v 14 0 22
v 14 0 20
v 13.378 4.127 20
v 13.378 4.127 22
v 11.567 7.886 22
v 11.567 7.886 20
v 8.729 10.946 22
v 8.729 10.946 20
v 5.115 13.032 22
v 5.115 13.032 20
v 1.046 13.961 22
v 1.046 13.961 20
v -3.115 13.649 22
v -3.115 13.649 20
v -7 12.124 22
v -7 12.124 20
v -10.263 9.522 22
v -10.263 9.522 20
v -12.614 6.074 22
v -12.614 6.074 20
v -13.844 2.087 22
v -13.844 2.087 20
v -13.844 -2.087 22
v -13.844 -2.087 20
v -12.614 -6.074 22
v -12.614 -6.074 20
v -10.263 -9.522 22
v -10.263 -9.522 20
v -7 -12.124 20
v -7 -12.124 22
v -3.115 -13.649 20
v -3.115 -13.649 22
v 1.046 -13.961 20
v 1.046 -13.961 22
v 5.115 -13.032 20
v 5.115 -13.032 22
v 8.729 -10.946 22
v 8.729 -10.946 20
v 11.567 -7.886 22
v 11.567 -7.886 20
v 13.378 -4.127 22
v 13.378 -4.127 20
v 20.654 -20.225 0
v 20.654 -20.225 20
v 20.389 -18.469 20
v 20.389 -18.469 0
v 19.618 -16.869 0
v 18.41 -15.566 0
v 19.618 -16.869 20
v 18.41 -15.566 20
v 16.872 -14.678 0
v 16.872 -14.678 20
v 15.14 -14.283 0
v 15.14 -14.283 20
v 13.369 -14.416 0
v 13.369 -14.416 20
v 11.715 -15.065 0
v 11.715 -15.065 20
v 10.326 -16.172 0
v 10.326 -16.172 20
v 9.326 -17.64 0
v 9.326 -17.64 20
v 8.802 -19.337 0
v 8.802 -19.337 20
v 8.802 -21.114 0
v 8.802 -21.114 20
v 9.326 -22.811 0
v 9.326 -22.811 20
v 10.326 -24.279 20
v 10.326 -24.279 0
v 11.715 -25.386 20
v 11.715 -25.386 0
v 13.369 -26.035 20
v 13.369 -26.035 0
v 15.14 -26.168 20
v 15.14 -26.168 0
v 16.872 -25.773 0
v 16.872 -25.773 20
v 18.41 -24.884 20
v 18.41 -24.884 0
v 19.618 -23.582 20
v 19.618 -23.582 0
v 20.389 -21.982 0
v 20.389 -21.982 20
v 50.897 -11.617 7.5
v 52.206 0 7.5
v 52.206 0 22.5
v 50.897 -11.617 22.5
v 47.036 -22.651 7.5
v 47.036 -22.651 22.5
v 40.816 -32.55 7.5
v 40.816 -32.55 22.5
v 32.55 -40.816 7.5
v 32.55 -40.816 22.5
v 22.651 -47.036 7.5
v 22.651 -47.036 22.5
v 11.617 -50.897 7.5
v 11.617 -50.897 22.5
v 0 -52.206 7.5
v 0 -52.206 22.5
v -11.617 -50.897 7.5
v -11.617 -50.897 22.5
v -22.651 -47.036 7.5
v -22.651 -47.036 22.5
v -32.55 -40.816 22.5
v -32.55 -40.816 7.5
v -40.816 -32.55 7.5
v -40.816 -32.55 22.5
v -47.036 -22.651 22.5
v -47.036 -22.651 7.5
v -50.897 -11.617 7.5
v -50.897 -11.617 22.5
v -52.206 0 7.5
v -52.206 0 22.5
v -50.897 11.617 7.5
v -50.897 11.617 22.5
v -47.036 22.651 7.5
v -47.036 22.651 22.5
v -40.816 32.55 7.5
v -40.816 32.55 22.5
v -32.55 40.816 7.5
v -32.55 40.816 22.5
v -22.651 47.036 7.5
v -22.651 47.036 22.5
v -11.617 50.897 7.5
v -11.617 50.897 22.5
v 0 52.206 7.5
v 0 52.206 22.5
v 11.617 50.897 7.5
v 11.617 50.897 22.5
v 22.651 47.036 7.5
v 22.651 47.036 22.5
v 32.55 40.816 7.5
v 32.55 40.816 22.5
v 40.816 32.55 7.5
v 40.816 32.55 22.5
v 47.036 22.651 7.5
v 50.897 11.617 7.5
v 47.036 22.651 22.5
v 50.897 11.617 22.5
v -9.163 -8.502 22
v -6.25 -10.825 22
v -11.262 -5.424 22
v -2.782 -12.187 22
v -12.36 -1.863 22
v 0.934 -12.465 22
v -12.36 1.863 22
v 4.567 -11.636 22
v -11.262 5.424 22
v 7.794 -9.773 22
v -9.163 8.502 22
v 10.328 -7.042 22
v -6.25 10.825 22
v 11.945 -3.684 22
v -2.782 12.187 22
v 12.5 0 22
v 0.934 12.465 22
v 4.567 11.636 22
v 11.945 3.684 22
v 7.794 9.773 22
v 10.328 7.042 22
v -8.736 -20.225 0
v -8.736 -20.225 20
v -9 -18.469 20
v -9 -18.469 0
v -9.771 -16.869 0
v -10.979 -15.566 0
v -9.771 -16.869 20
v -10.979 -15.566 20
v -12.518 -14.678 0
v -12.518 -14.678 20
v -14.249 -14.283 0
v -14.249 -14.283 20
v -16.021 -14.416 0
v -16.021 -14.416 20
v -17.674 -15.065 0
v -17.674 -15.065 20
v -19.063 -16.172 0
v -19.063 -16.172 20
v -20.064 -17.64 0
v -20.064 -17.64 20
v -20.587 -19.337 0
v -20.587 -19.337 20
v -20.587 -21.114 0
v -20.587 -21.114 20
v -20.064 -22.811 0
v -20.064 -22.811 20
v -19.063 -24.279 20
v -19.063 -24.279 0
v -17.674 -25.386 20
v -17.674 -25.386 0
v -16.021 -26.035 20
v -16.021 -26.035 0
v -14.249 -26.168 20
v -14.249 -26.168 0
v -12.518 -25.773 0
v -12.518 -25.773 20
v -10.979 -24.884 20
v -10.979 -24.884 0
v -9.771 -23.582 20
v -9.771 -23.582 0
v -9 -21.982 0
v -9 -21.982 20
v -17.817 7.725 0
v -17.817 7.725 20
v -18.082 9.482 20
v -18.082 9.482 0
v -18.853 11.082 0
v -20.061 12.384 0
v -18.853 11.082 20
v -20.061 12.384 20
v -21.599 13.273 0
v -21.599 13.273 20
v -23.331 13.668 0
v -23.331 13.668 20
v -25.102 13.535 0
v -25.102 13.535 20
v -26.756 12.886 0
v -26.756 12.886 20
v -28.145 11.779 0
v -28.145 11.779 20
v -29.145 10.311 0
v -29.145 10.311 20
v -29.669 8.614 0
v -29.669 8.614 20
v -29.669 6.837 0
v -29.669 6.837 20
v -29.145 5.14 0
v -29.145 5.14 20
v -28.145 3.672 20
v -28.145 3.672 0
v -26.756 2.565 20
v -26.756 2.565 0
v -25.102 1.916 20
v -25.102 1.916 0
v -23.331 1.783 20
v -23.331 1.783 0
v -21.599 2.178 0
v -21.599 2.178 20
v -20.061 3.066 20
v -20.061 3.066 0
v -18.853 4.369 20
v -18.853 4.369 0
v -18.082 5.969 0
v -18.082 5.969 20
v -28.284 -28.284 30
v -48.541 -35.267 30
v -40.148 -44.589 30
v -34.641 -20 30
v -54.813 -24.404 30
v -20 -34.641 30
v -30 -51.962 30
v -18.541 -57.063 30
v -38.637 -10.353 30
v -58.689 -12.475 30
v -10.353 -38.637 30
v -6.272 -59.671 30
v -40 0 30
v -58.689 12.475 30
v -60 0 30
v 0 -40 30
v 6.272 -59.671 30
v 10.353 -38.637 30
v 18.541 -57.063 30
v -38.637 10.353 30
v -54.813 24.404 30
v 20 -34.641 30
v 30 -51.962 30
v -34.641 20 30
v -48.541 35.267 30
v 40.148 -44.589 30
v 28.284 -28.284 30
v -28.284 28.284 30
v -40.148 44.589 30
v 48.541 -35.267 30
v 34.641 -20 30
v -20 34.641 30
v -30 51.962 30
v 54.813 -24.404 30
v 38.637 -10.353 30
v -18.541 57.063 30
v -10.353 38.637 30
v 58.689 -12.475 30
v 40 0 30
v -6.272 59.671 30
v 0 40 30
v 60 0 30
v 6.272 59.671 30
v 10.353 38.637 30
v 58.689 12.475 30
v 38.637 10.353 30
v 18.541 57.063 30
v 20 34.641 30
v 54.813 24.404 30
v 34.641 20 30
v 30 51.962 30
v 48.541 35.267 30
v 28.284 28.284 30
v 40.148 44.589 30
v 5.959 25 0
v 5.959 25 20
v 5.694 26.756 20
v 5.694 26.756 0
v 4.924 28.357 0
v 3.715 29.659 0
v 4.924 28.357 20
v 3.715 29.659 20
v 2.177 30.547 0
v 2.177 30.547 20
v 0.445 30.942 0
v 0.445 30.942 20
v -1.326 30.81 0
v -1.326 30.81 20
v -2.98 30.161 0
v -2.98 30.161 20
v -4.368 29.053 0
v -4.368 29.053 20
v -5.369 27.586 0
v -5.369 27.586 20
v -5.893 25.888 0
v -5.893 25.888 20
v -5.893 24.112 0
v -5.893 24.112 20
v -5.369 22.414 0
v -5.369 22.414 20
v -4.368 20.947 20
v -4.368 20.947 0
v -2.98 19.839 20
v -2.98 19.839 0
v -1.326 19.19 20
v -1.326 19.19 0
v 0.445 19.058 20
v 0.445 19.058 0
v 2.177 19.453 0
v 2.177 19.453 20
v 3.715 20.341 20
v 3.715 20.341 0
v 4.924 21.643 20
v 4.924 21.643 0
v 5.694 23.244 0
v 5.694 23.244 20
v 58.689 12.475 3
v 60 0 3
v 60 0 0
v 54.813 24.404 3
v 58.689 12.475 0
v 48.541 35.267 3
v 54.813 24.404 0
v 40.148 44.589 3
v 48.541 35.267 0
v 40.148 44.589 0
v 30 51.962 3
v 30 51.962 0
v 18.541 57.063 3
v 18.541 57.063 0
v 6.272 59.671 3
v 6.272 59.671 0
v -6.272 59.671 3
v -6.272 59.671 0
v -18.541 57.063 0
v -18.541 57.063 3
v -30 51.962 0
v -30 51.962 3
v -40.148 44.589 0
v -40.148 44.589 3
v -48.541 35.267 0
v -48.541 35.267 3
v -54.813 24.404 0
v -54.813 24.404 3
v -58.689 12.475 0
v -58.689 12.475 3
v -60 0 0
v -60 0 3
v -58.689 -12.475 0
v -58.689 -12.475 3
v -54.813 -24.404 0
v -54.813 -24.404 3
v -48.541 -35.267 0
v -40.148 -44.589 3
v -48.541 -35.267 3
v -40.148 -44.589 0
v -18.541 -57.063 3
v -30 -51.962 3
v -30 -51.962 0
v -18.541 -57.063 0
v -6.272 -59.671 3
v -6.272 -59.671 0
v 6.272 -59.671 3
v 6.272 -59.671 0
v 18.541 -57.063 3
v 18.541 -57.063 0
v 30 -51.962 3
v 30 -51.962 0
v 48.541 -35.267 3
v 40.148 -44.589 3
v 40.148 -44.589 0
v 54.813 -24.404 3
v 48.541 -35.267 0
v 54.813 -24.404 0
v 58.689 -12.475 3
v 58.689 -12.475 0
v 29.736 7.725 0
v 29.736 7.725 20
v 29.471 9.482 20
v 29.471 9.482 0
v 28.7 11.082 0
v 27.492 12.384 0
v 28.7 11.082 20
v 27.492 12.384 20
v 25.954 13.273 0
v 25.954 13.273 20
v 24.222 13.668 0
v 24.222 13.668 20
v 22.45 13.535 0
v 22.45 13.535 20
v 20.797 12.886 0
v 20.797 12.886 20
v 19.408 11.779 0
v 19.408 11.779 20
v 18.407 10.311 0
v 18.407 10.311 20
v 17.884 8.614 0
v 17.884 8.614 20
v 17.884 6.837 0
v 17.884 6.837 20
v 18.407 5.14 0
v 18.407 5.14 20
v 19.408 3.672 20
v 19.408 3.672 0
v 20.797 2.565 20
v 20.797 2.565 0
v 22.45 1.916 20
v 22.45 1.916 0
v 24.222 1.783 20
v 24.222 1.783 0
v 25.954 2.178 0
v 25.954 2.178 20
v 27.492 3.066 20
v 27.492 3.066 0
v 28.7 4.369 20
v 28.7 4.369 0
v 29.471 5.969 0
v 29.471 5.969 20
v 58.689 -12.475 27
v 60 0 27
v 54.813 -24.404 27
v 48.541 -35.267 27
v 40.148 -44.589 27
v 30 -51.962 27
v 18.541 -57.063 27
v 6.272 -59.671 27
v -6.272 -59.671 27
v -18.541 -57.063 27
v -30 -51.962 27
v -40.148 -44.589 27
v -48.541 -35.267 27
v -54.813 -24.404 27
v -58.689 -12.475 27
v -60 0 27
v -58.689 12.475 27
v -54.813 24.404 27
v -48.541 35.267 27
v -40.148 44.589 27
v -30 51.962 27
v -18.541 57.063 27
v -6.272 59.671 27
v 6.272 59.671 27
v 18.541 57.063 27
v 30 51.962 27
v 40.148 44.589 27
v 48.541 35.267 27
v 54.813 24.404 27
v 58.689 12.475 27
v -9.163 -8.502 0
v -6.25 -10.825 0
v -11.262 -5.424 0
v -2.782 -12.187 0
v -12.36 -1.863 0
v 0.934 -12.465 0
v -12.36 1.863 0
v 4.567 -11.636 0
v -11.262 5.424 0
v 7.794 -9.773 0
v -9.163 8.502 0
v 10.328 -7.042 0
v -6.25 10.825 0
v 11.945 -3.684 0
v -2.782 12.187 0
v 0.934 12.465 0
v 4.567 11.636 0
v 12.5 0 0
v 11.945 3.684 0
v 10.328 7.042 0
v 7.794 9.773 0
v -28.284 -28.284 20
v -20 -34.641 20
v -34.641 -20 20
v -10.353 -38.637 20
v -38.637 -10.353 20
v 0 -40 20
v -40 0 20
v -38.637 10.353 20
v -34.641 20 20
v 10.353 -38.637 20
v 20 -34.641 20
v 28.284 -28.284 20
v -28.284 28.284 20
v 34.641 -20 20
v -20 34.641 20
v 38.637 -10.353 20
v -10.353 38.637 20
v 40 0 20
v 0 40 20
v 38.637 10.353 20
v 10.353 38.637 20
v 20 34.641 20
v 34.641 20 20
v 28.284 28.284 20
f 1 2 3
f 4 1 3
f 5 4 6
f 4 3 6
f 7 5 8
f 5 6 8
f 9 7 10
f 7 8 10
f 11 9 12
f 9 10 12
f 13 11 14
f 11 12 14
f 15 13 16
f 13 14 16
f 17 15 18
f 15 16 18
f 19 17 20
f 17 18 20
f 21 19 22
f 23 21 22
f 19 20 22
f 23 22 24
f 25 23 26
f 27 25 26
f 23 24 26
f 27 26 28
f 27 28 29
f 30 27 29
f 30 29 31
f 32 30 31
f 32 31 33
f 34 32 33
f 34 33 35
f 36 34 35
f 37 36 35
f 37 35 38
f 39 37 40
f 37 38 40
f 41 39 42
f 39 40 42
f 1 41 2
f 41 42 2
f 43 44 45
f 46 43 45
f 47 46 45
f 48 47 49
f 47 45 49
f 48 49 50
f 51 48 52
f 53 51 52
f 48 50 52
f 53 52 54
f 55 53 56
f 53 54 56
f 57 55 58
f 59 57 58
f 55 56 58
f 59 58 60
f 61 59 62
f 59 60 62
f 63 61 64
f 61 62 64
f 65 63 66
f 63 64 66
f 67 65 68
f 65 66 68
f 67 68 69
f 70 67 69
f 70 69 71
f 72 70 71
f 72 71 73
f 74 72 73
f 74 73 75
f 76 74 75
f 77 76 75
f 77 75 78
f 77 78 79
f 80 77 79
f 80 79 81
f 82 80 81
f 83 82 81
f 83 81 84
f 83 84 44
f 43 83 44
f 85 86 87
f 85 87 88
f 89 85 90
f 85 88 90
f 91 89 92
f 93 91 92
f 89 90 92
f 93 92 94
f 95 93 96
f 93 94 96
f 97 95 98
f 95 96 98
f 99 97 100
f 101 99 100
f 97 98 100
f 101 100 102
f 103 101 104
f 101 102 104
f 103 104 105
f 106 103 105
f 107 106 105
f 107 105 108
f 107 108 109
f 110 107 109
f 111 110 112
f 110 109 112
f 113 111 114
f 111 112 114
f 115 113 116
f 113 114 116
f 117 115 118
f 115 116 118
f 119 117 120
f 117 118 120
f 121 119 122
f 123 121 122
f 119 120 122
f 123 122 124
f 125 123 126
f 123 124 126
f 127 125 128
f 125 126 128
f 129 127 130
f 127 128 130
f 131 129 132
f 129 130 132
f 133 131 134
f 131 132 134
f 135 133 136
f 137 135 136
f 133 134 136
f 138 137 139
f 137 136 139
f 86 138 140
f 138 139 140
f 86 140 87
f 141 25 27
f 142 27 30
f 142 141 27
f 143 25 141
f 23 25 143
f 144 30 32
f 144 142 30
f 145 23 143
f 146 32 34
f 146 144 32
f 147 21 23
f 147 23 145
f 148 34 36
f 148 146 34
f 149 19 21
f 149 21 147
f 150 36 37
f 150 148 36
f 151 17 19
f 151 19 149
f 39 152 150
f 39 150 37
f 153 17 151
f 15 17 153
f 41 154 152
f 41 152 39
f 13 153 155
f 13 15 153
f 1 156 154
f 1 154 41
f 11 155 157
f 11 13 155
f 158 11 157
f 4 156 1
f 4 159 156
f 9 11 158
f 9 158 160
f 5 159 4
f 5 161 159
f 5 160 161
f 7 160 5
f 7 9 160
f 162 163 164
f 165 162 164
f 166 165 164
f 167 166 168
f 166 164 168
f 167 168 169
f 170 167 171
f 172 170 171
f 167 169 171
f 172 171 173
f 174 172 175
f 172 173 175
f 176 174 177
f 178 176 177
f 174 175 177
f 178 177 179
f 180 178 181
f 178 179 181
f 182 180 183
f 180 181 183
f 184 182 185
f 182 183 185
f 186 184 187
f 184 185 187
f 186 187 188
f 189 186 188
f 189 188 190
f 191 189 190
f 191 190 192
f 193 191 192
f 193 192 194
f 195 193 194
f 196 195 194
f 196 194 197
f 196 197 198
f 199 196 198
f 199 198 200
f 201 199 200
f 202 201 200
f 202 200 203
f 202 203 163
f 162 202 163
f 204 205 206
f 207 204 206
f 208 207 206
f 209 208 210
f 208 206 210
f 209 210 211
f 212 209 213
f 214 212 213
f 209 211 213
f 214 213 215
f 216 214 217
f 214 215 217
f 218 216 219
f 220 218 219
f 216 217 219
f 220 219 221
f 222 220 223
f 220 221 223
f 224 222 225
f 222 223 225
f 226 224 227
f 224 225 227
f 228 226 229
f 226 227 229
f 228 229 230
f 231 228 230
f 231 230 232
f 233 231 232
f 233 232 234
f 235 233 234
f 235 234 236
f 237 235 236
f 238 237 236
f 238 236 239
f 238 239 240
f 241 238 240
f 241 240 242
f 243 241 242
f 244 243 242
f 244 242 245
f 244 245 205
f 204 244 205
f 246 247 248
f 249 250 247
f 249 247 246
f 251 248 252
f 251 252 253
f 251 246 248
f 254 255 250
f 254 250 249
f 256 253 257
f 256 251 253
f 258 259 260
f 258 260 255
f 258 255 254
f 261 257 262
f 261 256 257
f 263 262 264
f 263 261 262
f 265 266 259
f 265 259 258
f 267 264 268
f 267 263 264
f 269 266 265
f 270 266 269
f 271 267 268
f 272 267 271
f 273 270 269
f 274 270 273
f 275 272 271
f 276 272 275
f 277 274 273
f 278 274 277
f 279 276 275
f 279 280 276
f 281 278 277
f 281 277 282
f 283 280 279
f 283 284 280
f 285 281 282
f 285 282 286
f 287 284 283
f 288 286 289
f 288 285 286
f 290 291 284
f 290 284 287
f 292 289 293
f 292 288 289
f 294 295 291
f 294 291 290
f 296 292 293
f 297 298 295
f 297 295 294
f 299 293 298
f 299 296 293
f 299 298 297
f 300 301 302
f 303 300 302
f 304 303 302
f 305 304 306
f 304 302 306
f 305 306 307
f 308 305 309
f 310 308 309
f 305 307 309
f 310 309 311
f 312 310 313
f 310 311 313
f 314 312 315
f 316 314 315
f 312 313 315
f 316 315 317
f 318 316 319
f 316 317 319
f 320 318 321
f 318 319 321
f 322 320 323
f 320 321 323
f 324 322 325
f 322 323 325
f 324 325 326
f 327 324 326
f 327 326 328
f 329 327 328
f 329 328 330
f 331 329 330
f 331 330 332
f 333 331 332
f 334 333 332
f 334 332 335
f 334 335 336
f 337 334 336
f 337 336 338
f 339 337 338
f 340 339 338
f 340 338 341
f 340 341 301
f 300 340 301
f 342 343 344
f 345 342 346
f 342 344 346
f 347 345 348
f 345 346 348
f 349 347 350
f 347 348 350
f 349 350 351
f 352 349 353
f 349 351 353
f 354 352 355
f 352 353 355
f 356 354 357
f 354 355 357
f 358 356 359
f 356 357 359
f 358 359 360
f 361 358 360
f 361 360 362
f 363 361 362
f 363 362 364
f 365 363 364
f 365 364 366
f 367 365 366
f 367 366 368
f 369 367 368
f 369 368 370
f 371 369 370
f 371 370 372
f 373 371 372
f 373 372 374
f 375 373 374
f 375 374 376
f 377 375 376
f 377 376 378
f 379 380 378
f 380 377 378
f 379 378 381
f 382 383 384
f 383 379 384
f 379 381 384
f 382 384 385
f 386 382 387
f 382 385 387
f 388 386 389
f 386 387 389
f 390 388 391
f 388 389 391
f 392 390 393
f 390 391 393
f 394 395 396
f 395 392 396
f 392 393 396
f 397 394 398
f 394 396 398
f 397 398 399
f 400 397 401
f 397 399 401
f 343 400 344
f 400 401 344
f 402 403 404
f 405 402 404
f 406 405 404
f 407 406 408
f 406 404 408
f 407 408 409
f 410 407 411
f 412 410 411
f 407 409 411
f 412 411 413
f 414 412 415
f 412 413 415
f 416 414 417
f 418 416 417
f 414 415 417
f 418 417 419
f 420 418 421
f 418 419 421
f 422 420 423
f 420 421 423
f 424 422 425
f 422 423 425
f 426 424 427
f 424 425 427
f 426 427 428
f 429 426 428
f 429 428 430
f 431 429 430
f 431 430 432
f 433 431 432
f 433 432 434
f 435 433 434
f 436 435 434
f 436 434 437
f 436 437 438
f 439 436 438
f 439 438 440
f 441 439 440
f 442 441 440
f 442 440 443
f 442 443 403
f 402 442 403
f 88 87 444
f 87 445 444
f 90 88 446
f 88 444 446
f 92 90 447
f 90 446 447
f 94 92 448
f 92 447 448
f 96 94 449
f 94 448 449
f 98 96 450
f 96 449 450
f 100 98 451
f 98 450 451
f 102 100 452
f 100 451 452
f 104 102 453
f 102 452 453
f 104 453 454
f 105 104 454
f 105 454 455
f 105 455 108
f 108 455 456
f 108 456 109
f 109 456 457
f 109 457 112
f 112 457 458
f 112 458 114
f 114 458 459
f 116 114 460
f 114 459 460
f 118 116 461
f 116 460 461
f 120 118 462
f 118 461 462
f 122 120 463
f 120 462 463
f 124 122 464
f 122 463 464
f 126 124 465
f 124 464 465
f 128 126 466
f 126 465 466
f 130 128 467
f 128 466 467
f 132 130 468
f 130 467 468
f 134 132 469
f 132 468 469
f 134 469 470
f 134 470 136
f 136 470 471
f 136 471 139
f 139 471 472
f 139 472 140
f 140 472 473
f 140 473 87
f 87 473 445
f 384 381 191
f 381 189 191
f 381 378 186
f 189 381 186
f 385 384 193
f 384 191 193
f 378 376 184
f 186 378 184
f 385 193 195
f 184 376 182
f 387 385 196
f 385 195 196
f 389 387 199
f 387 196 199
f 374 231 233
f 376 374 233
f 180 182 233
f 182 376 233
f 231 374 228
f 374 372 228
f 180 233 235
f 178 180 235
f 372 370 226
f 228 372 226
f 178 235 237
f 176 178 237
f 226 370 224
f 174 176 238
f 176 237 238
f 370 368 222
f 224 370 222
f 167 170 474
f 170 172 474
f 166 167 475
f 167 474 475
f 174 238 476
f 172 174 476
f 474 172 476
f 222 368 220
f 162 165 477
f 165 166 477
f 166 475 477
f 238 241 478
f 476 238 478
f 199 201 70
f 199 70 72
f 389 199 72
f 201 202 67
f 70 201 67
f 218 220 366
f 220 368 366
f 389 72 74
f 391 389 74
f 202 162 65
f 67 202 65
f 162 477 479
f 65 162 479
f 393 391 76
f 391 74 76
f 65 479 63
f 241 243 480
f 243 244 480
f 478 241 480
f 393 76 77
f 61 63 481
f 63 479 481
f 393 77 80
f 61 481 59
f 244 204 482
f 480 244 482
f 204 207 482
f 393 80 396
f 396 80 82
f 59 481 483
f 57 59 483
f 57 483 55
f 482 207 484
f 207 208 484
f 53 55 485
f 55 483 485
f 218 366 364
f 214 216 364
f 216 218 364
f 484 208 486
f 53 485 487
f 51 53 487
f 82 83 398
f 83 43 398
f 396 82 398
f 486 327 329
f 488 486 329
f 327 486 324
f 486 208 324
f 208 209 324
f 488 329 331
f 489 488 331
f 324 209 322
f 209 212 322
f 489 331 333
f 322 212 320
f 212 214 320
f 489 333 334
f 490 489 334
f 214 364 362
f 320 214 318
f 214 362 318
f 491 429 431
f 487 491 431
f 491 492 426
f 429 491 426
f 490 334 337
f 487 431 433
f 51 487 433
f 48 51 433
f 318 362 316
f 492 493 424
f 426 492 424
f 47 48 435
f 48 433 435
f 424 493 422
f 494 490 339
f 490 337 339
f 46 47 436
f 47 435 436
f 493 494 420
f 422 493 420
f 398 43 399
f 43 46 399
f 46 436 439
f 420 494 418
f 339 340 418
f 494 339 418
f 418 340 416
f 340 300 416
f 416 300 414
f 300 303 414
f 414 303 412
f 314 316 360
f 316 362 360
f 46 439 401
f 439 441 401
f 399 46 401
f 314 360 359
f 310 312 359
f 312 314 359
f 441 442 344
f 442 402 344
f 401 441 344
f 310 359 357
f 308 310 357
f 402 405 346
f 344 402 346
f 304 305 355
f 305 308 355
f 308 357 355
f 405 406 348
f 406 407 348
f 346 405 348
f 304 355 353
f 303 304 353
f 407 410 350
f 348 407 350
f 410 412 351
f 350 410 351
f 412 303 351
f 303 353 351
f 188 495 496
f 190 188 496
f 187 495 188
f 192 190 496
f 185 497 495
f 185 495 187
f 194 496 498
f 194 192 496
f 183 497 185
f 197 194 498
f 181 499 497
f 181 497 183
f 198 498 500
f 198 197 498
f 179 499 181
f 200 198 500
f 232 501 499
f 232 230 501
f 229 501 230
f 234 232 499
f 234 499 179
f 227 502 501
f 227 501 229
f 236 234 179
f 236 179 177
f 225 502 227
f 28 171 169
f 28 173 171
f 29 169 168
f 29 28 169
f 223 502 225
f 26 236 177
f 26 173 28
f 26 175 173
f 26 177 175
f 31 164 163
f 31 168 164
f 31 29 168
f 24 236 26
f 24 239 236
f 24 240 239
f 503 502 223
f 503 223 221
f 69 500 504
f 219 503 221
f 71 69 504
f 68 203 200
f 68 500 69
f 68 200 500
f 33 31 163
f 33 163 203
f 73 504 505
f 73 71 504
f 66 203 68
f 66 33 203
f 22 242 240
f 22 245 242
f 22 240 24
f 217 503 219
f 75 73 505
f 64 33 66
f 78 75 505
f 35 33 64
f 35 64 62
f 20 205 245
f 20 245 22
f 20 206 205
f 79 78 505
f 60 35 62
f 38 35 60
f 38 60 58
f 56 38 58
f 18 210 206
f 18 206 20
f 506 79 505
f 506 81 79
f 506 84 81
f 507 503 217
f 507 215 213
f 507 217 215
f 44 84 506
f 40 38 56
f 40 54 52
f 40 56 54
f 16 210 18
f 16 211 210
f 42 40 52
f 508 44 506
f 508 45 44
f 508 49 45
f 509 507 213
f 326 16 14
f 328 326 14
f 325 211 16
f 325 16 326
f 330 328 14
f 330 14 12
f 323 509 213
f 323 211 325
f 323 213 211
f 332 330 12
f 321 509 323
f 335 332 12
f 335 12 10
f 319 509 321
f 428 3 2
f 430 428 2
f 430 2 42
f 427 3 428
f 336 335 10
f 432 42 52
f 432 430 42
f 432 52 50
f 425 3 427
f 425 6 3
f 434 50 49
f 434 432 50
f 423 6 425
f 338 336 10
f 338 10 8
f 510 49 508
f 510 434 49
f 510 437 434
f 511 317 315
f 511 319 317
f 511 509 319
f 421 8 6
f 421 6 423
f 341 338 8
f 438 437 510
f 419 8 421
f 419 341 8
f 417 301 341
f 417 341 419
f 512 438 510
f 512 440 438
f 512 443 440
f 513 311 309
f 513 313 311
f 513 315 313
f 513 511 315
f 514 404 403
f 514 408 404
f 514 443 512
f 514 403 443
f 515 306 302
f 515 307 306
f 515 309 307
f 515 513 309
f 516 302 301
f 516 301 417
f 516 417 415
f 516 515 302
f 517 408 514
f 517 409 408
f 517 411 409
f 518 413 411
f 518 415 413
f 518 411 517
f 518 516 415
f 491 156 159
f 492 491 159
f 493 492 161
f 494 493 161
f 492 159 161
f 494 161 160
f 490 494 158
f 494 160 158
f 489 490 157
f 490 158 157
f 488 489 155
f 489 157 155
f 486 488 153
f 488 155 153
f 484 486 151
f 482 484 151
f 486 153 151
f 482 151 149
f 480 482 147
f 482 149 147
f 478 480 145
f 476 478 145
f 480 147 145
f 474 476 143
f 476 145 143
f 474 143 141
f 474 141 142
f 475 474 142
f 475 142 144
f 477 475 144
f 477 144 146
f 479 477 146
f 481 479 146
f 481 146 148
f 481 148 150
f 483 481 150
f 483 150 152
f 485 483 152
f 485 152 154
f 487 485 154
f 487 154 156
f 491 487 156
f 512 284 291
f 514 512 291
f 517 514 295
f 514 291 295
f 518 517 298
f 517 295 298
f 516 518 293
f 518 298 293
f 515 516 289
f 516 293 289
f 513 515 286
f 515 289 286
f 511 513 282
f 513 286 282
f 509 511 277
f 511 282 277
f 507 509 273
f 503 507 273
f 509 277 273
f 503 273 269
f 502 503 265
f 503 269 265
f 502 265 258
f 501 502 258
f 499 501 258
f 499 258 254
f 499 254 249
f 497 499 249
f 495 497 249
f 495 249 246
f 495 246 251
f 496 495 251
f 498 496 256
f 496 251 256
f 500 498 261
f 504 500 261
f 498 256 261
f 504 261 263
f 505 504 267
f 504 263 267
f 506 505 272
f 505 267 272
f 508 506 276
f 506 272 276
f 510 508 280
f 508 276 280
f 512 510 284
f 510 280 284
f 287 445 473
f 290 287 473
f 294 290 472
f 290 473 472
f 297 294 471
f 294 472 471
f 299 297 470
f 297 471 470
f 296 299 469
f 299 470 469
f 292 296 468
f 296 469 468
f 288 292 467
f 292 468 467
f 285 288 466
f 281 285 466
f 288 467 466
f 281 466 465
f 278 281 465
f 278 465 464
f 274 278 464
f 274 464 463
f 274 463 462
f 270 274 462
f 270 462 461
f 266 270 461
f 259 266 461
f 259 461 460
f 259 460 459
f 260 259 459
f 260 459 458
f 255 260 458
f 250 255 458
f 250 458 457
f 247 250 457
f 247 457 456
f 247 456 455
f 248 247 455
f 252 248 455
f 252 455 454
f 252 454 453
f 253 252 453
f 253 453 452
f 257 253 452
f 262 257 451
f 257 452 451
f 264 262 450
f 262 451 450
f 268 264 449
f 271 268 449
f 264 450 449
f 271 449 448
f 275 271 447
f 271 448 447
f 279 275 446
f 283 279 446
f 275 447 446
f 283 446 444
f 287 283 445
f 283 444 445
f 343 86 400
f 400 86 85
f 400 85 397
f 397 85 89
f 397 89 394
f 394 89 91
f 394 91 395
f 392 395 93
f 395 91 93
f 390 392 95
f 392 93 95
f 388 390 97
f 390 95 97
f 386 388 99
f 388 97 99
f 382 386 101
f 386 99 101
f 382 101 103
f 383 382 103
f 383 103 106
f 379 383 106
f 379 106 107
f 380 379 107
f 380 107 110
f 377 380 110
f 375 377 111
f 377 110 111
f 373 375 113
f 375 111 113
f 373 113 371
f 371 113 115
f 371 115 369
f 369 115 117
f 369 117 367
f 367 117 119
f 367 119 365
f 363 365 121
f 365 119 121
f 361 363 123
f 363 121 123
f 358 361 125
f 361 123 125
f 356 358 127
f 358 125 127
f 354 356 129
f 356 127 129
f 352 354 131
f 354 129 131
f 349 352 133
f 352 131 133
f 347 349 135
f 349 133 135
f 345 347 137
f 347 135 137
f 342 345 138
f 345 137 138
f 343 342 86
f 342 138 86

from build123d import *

# Parameters (mm, degrees)
SKETCH1_R                = 60
SKETCH1_R_2              = 12.5
BOSS_EXTRUDE2_DEPTH      = 30
SKETCH3_R                = 40
CUT_EXTRUDE3_DEPTH       = 10
SKETCH4_R                = 5.959098303
CUT_EXTRUDE4_DEPTH       = 21
SKETCH7_R                = 14
SKETCH7_R_2              = 12.5
BOSS_EXTRUDE6_DEPTH      = 2
BOSS_EXTRUDE6_DEPTH_BACK = 7


with BuildPart() as part:
    # Sketch1 → Boss-Extrude2 (new body)
    with BuildSketch(Plane.XY):
        Circle(SKETCH1_R)
        Circle(SKETCH1_R_2, mode=Mode.SUBTRACT)
    extrude(amount=BOSS_EXTRUDE2_DEPTH)

    # Sketch3 → Cut-Extrude3 (cut)
    with BuildSketch(Plane.XY.offset(30)):
        Circle(SKETCH3_R)
    cut_extrude3 = extrude(amount=-CUT_EXTRUDE3_DEPTH, mode=Mode.SUBTRACT)

    # Mirror6: Cut-Extrude3 across plane
    add(cut_extrude3.mirror(Plane.XY), mode=Mode.SUBTRACT)

    # Sketch4 → Cut-Extrude4 (cut, through all)
    with BuildSketch(Plane.XY.offset(20)):
        with Locations((0, 25)):
            Circle(SKETCH4_R)
        with Locations((23.776412907, 7.725424859)):
            Circle(SKETCH4_R)
        with Locations((14.694631307, -20.225424859)):
            Circle(SKETCH4_R)
        with Locations((-14.694631307, -20.225424859)):
            Circle(SKETCH4_R)
        with Locations((-23.776412907, 7.725424859)):
            Circle(SKETCH4_R)
    extrude(amount=-CUT_EXTRUDE4_DEPTH, mode=Mode.SUBTRACT)

    # Sketch6 → Cut-Revolve1 (revolve, cut)
    with BuildSketch(Plane(origin=(0, 0, 0), x_dir=(1, 0, 0), z_dir=(0, 1, 0))):
        Polygon((60, -3), (52.205771366, -7.5), (52.205771366, -22.5), (60, -27), align=None)
    revolve(axis=Axis((0, 0, 0), (0, 0, -1)), mode=Mode.SUBTRACT)

    # Sketch7 → Boss-Extrude6 (add, two sides)
    with BuildSketch(Plane.XY.offset(20)) as boss_extrude6_sk:
        Circle(SKETCH7_R)
        Circle(SKETCH7_R_2, mode=Mode.SUBTRACT)
    extrude(amount=BOSS_EXTRUDE6_DEPTH)
    extrude(boss_extrude6_sk.sketch, amount=-BOSS_EXTRUDE6_DEPTH_BACK)


solid = part.part
